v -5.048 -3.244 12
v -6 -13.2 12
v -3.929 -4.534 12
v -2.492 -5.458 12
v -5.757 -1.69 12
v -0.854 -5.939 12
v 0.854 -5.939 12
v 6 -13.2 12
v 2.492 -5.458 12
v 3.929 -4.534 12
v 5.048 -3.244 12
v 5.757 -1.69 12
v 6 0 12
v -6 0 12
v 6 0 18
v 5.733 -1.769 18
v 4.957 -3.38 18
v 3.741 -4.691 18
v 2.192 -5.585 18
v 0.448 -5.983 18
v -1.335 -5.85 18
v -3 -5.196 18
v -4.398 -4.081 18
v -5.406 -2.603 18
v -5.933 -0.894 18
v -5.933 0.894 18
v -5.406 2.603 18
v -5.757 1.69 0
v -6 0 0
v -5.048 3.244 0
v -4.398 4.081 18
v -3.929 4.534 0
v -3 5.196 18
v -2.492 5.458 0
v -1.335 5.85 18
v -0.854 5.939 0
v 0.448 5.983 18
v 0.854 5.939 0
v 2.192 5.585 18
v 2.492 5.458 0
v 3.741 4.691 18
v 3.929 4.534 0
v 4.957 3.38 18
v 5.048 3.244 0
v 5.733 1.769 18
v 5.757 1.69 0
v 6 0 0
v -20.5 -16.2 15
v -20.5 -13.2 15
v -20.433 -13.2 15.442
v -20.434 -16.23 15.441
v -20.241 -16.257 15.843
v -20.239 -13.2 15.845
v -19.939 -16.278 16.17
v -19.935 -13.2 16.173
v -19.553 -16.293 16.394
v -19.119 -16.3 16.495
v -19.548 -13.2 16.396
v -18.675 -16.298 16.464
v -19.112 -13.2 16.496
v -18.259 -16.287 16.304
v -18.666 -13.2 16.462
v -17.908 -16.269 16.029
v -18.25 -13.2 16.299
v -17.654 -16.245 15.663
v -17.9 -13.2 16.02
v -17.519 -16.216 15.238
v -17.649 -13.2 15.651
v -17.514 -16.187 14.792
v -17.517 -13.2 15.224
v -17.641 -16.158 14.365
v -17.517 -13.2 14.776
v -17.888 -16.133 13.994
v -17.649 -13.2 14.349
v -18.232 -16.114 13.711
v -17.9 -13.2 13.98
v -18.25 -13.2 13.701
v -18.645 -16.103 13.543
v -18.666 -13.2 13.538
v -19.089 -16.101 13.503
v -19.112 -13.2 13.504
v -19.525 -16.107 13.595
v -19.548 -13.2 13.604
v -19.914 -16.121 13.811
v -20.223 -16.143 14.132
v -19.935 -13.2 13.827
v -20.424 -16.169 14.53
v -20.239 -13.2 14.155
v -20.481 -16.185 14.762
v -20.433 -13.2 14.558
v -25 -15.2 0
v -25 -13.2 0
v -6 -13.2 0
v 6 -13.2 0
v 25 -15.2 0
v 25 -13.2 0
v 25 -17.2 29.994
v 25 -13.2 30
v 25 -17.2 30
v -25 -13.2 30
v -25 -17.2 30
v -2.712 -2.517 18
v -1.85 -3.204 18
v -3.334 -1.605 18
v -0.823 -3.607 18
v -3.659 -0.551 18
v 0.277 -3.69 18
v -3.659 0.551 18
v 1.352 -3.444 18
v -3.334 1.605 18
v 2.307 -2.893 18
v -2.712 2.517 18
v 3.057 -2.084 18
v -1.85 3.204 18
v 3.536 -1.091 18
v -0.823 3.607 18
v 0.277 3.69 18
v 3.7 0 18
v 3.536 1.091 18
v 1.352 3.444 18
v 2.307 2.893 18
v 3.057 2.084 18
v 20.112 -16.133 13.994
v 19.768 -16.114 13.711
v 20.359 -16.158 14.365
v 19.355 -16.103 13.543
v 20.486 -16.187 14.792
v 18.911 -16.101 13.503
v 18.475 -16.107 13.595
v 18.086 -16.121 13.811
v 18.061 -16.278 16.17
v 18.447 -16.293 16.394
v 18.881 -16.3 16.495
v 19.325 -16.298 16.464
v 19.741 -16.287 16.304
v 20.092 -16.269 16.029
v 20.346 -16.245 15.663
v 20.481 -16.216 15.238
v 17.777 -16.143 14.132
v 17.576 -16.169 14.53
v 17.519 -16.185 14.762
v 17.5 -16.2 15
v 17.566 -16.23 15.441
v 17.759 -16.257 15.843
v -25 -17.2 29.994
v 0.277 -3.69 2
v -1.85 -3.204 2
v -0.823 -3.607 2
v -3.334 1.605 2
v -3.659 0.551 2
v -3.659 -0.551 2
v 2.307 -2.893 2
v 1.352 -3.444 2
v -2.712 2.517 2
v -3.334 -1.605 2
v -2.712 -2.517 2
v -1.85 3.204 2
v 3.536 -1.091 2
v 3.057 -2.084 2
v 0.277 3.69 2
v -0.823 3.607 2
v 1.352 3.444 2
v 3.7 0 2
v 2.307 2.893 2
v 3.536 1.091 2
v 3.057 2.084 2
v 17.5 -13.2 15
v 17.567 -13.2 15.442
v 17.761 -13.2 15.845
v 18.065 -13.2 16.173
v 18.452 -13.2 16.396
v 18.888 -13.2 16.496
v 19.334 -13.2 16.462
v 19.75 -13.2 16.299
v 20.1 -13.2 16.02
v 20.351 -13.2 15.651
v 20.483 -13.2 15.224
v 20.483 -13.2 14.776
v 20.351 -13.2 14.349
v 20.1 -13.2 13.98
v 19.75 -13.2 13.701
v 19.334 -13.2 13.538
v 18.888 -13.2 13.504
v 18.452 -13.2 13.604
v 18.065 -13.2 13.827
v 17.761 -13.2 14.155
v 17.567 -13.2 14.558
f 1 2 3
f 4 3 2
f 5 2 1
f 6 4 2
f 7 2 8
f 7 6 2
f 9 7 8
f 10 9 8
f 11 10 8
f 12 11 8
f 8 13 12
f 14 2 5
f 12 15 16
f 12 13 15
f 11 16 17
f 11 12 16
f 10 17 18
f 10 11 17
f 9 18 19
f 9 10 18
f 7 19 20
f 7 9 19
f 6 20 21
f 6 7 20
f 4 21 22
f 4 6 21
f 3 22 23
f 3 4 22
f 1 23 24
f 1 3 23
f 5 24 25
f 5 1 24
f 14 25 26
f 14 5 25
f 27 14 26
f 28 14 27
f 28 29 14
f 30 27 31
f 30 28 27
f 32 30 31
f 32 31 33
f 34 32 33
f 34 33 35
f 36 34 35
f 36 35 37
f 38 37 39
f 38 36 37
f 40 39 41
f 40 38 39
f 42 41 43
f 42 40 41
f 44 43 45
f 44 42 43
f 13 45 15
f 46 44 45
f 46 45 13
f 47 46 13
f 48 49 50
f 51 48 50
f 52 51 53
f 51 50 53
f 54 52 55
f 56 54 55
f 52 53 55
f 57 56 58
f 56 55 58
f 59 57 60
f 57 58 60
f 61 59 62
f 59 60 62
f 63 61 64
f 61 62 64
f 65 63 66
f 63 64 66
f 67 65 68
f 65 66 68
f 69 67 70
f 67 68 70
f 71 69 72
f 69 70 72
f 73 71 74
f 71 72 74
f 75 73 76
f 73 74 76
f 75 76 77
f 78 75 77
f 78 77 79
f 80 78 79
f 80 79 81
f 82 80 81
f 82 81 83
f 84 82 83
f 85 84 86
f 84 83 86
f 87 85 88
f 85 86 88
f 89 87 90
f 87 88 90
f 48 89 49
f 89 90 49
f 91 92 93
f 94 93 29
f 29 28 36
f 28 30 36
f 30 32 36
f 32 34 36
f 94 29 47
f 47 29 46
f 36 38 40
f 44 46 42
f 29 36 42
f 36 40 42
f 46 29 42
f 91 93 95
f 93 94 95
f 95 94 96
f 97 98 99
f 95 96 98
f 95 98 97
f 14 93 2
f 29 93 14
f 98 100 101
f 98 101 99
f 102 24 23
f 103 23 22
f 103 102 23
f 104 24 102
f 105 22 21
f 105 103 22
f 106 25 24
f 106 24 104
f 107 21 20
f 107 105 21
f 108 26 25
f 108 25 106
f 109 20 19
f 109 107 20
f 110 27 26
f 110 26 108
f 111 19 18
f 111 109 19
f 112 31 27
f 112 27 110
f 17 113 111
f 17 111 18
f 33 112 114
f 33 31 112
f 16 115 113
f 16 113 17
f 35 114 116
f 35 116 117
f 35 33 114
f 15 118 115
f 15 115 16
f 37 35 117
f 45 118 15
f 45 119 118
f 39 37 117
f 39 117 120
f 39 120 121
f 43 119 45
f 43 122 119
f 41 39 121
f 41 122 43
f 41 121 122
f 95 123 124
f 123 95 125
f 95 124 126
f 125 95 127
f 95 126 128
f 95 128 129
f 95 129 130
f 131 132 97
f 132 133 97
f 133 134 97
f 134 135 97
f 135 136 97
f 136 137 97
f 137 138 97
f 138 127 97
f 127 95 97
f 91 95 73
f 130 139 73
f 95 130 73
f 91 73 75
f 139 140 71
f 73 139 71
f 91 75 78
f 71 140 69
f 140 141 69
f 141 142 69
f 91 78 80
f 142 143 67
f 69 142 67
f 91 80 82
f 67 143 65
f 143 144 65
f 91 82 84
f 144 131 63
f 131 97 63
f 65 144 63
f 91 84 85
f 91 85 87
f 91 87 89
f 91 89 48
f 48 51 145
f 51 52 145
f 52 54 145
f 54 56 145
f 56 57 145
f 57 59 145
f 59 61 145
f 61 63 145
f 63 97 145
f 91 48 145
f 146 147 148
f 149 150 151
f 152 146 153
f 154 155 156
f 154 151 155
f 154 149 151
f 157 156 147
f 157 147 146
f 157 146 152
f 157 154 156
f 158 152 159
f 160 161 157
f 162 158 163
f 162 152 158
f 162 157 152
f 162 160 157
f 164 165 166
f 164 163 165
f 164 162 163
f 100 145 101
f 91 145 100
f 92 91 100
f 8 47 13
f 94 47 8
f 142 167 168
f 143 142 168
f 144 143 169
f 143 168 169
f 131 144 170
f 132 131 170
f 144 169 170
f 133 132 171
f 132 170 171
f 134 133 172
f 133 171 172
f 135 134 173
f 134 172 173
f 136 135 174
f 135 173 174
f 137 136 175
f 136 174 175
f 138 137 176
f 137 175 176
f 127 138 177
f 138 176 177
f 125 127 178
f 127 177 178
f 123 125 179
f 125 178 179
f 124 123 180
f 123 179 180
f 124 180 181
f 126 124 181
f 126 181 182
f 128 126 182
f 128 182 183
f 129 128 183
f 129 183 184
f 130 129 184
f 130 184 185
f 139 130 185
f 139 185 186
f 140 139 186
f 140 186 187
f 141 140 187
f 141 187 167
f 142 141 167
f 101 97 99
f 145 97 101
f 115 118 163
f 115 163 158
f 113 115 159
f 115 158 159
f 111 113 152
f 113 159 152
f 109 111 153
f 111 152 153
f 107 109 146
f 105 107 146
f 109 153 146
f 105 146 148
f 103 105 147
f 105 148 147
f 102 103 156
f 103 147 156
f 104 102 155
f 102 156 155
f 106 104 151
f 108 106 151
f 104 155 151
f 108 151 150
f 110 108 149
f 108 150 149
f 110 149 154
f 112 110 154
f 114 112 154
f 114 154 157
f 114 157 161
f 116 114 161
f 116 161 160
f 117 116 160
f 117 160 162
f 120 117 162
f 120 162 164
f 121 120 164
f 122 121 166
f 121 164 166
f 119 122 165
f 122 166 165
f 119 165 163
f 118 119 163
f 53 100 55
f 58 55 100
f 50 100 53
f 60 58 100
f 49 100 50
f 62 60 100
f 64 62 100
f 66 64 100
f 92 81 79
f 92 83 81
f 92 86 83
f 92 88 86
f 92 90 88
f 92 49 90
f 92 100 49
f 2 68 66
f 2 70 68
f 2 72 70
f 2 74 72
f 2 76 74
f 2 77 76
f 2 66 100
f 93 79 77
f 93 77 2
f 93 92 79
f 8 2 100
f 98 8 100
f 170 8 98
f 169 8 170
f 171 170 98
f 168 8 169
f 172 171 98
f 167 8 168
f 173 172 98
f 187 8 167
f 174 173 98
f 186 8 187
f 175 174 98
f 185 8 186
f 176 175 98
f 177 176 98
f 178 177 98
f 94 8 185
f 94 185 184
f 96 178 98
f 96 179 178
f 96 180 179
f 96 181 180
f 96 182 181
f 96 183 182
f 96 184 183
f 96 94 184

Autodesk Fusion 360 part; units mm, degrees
sketch "Sketch1" plane through (0, 0, 0) normal (0, 0, 1) x (1, 0, 0)
  circle A0 centre (0, 0) radius 3.7
  circle A1 centre (0, 0) radius 6
  line L0 (-25, -13.2) -> (25, -13.2)
  line L1 (25, -13.2) -> (25, -17.2)
  line L2 (25, -17.2) -> (-25, -17.2)
  line L3 (-25, -17.2) -> (-25, -13.2)
  line L4 (-6, 0) -> (6, 0)
  line L5 (6, 0) -> (6, -13.2)
  line L6 (6, -13.2) -> (-6, -13.2)
  line L7 (-6, -13.2) -> (-6, 0)
  point P0 (0, -13.2)
  dimension "d1" = 7.4
  dimension "d2" = 12
  dimension "d7" = 50
  dimension "d8" = 13.2
  dimension "d30" = 4
extrude "Extrude1" add sketch "Sketch1" along normal blind 2 contours A0 L4 | A0 A1 L4 | A0 A1 L4 | A0 L4
extrude "Extrude2" add sketch "Sketch1" along normal blind 18 contours A0 A1 L4 | A0 A1 L4
extrude "Extrude3" add sketch "Sketch1" along normal blind 12 contours A1 L0 L5 L6 L7
extrude "Extrude4" add sketch "Sketch1" along normal blind 30 contours L0 L1 L2 L3 L6
sketch "Sketch4" plane through (0, -13.2, 0) normal (0, 1, 0) x (-1, 0, 0)
  line L0 (6, 12) -> (6, 0)
  line L1 (6, 0) -> (25, 0)
  line L2 (25, 0) -> (25, 30)
  line L3 (25, 30) -> (-25, 30)
  line L4 (-25, 30) -> (-25, 0)
  line L5 (-25, 0) -> (-6, 0)
  line L6 (-6, 0) -> (-6, 12)
  line L7 (-6, 12) -> (6, 12)
  circle A0 centre (-19, 15) radius 1.5
  circle A1 centre (19, 15) radius 1.5
  point P0 (-25, 15)
  point P1 (25, 15)
  dimension "d31" = 3
  dimension "d32" = 3
  dimension "d33" = 6
  dimension "d35" = 6
chamfer "Chamfer1" distance 2 distance2 30 1 edges at (0, -17.2, 0) measured on face at (-2, -4.4, 0)
extrude "Extrude8" cut sketch "Sketch4" against normal blind 16 contours A0 | A1
